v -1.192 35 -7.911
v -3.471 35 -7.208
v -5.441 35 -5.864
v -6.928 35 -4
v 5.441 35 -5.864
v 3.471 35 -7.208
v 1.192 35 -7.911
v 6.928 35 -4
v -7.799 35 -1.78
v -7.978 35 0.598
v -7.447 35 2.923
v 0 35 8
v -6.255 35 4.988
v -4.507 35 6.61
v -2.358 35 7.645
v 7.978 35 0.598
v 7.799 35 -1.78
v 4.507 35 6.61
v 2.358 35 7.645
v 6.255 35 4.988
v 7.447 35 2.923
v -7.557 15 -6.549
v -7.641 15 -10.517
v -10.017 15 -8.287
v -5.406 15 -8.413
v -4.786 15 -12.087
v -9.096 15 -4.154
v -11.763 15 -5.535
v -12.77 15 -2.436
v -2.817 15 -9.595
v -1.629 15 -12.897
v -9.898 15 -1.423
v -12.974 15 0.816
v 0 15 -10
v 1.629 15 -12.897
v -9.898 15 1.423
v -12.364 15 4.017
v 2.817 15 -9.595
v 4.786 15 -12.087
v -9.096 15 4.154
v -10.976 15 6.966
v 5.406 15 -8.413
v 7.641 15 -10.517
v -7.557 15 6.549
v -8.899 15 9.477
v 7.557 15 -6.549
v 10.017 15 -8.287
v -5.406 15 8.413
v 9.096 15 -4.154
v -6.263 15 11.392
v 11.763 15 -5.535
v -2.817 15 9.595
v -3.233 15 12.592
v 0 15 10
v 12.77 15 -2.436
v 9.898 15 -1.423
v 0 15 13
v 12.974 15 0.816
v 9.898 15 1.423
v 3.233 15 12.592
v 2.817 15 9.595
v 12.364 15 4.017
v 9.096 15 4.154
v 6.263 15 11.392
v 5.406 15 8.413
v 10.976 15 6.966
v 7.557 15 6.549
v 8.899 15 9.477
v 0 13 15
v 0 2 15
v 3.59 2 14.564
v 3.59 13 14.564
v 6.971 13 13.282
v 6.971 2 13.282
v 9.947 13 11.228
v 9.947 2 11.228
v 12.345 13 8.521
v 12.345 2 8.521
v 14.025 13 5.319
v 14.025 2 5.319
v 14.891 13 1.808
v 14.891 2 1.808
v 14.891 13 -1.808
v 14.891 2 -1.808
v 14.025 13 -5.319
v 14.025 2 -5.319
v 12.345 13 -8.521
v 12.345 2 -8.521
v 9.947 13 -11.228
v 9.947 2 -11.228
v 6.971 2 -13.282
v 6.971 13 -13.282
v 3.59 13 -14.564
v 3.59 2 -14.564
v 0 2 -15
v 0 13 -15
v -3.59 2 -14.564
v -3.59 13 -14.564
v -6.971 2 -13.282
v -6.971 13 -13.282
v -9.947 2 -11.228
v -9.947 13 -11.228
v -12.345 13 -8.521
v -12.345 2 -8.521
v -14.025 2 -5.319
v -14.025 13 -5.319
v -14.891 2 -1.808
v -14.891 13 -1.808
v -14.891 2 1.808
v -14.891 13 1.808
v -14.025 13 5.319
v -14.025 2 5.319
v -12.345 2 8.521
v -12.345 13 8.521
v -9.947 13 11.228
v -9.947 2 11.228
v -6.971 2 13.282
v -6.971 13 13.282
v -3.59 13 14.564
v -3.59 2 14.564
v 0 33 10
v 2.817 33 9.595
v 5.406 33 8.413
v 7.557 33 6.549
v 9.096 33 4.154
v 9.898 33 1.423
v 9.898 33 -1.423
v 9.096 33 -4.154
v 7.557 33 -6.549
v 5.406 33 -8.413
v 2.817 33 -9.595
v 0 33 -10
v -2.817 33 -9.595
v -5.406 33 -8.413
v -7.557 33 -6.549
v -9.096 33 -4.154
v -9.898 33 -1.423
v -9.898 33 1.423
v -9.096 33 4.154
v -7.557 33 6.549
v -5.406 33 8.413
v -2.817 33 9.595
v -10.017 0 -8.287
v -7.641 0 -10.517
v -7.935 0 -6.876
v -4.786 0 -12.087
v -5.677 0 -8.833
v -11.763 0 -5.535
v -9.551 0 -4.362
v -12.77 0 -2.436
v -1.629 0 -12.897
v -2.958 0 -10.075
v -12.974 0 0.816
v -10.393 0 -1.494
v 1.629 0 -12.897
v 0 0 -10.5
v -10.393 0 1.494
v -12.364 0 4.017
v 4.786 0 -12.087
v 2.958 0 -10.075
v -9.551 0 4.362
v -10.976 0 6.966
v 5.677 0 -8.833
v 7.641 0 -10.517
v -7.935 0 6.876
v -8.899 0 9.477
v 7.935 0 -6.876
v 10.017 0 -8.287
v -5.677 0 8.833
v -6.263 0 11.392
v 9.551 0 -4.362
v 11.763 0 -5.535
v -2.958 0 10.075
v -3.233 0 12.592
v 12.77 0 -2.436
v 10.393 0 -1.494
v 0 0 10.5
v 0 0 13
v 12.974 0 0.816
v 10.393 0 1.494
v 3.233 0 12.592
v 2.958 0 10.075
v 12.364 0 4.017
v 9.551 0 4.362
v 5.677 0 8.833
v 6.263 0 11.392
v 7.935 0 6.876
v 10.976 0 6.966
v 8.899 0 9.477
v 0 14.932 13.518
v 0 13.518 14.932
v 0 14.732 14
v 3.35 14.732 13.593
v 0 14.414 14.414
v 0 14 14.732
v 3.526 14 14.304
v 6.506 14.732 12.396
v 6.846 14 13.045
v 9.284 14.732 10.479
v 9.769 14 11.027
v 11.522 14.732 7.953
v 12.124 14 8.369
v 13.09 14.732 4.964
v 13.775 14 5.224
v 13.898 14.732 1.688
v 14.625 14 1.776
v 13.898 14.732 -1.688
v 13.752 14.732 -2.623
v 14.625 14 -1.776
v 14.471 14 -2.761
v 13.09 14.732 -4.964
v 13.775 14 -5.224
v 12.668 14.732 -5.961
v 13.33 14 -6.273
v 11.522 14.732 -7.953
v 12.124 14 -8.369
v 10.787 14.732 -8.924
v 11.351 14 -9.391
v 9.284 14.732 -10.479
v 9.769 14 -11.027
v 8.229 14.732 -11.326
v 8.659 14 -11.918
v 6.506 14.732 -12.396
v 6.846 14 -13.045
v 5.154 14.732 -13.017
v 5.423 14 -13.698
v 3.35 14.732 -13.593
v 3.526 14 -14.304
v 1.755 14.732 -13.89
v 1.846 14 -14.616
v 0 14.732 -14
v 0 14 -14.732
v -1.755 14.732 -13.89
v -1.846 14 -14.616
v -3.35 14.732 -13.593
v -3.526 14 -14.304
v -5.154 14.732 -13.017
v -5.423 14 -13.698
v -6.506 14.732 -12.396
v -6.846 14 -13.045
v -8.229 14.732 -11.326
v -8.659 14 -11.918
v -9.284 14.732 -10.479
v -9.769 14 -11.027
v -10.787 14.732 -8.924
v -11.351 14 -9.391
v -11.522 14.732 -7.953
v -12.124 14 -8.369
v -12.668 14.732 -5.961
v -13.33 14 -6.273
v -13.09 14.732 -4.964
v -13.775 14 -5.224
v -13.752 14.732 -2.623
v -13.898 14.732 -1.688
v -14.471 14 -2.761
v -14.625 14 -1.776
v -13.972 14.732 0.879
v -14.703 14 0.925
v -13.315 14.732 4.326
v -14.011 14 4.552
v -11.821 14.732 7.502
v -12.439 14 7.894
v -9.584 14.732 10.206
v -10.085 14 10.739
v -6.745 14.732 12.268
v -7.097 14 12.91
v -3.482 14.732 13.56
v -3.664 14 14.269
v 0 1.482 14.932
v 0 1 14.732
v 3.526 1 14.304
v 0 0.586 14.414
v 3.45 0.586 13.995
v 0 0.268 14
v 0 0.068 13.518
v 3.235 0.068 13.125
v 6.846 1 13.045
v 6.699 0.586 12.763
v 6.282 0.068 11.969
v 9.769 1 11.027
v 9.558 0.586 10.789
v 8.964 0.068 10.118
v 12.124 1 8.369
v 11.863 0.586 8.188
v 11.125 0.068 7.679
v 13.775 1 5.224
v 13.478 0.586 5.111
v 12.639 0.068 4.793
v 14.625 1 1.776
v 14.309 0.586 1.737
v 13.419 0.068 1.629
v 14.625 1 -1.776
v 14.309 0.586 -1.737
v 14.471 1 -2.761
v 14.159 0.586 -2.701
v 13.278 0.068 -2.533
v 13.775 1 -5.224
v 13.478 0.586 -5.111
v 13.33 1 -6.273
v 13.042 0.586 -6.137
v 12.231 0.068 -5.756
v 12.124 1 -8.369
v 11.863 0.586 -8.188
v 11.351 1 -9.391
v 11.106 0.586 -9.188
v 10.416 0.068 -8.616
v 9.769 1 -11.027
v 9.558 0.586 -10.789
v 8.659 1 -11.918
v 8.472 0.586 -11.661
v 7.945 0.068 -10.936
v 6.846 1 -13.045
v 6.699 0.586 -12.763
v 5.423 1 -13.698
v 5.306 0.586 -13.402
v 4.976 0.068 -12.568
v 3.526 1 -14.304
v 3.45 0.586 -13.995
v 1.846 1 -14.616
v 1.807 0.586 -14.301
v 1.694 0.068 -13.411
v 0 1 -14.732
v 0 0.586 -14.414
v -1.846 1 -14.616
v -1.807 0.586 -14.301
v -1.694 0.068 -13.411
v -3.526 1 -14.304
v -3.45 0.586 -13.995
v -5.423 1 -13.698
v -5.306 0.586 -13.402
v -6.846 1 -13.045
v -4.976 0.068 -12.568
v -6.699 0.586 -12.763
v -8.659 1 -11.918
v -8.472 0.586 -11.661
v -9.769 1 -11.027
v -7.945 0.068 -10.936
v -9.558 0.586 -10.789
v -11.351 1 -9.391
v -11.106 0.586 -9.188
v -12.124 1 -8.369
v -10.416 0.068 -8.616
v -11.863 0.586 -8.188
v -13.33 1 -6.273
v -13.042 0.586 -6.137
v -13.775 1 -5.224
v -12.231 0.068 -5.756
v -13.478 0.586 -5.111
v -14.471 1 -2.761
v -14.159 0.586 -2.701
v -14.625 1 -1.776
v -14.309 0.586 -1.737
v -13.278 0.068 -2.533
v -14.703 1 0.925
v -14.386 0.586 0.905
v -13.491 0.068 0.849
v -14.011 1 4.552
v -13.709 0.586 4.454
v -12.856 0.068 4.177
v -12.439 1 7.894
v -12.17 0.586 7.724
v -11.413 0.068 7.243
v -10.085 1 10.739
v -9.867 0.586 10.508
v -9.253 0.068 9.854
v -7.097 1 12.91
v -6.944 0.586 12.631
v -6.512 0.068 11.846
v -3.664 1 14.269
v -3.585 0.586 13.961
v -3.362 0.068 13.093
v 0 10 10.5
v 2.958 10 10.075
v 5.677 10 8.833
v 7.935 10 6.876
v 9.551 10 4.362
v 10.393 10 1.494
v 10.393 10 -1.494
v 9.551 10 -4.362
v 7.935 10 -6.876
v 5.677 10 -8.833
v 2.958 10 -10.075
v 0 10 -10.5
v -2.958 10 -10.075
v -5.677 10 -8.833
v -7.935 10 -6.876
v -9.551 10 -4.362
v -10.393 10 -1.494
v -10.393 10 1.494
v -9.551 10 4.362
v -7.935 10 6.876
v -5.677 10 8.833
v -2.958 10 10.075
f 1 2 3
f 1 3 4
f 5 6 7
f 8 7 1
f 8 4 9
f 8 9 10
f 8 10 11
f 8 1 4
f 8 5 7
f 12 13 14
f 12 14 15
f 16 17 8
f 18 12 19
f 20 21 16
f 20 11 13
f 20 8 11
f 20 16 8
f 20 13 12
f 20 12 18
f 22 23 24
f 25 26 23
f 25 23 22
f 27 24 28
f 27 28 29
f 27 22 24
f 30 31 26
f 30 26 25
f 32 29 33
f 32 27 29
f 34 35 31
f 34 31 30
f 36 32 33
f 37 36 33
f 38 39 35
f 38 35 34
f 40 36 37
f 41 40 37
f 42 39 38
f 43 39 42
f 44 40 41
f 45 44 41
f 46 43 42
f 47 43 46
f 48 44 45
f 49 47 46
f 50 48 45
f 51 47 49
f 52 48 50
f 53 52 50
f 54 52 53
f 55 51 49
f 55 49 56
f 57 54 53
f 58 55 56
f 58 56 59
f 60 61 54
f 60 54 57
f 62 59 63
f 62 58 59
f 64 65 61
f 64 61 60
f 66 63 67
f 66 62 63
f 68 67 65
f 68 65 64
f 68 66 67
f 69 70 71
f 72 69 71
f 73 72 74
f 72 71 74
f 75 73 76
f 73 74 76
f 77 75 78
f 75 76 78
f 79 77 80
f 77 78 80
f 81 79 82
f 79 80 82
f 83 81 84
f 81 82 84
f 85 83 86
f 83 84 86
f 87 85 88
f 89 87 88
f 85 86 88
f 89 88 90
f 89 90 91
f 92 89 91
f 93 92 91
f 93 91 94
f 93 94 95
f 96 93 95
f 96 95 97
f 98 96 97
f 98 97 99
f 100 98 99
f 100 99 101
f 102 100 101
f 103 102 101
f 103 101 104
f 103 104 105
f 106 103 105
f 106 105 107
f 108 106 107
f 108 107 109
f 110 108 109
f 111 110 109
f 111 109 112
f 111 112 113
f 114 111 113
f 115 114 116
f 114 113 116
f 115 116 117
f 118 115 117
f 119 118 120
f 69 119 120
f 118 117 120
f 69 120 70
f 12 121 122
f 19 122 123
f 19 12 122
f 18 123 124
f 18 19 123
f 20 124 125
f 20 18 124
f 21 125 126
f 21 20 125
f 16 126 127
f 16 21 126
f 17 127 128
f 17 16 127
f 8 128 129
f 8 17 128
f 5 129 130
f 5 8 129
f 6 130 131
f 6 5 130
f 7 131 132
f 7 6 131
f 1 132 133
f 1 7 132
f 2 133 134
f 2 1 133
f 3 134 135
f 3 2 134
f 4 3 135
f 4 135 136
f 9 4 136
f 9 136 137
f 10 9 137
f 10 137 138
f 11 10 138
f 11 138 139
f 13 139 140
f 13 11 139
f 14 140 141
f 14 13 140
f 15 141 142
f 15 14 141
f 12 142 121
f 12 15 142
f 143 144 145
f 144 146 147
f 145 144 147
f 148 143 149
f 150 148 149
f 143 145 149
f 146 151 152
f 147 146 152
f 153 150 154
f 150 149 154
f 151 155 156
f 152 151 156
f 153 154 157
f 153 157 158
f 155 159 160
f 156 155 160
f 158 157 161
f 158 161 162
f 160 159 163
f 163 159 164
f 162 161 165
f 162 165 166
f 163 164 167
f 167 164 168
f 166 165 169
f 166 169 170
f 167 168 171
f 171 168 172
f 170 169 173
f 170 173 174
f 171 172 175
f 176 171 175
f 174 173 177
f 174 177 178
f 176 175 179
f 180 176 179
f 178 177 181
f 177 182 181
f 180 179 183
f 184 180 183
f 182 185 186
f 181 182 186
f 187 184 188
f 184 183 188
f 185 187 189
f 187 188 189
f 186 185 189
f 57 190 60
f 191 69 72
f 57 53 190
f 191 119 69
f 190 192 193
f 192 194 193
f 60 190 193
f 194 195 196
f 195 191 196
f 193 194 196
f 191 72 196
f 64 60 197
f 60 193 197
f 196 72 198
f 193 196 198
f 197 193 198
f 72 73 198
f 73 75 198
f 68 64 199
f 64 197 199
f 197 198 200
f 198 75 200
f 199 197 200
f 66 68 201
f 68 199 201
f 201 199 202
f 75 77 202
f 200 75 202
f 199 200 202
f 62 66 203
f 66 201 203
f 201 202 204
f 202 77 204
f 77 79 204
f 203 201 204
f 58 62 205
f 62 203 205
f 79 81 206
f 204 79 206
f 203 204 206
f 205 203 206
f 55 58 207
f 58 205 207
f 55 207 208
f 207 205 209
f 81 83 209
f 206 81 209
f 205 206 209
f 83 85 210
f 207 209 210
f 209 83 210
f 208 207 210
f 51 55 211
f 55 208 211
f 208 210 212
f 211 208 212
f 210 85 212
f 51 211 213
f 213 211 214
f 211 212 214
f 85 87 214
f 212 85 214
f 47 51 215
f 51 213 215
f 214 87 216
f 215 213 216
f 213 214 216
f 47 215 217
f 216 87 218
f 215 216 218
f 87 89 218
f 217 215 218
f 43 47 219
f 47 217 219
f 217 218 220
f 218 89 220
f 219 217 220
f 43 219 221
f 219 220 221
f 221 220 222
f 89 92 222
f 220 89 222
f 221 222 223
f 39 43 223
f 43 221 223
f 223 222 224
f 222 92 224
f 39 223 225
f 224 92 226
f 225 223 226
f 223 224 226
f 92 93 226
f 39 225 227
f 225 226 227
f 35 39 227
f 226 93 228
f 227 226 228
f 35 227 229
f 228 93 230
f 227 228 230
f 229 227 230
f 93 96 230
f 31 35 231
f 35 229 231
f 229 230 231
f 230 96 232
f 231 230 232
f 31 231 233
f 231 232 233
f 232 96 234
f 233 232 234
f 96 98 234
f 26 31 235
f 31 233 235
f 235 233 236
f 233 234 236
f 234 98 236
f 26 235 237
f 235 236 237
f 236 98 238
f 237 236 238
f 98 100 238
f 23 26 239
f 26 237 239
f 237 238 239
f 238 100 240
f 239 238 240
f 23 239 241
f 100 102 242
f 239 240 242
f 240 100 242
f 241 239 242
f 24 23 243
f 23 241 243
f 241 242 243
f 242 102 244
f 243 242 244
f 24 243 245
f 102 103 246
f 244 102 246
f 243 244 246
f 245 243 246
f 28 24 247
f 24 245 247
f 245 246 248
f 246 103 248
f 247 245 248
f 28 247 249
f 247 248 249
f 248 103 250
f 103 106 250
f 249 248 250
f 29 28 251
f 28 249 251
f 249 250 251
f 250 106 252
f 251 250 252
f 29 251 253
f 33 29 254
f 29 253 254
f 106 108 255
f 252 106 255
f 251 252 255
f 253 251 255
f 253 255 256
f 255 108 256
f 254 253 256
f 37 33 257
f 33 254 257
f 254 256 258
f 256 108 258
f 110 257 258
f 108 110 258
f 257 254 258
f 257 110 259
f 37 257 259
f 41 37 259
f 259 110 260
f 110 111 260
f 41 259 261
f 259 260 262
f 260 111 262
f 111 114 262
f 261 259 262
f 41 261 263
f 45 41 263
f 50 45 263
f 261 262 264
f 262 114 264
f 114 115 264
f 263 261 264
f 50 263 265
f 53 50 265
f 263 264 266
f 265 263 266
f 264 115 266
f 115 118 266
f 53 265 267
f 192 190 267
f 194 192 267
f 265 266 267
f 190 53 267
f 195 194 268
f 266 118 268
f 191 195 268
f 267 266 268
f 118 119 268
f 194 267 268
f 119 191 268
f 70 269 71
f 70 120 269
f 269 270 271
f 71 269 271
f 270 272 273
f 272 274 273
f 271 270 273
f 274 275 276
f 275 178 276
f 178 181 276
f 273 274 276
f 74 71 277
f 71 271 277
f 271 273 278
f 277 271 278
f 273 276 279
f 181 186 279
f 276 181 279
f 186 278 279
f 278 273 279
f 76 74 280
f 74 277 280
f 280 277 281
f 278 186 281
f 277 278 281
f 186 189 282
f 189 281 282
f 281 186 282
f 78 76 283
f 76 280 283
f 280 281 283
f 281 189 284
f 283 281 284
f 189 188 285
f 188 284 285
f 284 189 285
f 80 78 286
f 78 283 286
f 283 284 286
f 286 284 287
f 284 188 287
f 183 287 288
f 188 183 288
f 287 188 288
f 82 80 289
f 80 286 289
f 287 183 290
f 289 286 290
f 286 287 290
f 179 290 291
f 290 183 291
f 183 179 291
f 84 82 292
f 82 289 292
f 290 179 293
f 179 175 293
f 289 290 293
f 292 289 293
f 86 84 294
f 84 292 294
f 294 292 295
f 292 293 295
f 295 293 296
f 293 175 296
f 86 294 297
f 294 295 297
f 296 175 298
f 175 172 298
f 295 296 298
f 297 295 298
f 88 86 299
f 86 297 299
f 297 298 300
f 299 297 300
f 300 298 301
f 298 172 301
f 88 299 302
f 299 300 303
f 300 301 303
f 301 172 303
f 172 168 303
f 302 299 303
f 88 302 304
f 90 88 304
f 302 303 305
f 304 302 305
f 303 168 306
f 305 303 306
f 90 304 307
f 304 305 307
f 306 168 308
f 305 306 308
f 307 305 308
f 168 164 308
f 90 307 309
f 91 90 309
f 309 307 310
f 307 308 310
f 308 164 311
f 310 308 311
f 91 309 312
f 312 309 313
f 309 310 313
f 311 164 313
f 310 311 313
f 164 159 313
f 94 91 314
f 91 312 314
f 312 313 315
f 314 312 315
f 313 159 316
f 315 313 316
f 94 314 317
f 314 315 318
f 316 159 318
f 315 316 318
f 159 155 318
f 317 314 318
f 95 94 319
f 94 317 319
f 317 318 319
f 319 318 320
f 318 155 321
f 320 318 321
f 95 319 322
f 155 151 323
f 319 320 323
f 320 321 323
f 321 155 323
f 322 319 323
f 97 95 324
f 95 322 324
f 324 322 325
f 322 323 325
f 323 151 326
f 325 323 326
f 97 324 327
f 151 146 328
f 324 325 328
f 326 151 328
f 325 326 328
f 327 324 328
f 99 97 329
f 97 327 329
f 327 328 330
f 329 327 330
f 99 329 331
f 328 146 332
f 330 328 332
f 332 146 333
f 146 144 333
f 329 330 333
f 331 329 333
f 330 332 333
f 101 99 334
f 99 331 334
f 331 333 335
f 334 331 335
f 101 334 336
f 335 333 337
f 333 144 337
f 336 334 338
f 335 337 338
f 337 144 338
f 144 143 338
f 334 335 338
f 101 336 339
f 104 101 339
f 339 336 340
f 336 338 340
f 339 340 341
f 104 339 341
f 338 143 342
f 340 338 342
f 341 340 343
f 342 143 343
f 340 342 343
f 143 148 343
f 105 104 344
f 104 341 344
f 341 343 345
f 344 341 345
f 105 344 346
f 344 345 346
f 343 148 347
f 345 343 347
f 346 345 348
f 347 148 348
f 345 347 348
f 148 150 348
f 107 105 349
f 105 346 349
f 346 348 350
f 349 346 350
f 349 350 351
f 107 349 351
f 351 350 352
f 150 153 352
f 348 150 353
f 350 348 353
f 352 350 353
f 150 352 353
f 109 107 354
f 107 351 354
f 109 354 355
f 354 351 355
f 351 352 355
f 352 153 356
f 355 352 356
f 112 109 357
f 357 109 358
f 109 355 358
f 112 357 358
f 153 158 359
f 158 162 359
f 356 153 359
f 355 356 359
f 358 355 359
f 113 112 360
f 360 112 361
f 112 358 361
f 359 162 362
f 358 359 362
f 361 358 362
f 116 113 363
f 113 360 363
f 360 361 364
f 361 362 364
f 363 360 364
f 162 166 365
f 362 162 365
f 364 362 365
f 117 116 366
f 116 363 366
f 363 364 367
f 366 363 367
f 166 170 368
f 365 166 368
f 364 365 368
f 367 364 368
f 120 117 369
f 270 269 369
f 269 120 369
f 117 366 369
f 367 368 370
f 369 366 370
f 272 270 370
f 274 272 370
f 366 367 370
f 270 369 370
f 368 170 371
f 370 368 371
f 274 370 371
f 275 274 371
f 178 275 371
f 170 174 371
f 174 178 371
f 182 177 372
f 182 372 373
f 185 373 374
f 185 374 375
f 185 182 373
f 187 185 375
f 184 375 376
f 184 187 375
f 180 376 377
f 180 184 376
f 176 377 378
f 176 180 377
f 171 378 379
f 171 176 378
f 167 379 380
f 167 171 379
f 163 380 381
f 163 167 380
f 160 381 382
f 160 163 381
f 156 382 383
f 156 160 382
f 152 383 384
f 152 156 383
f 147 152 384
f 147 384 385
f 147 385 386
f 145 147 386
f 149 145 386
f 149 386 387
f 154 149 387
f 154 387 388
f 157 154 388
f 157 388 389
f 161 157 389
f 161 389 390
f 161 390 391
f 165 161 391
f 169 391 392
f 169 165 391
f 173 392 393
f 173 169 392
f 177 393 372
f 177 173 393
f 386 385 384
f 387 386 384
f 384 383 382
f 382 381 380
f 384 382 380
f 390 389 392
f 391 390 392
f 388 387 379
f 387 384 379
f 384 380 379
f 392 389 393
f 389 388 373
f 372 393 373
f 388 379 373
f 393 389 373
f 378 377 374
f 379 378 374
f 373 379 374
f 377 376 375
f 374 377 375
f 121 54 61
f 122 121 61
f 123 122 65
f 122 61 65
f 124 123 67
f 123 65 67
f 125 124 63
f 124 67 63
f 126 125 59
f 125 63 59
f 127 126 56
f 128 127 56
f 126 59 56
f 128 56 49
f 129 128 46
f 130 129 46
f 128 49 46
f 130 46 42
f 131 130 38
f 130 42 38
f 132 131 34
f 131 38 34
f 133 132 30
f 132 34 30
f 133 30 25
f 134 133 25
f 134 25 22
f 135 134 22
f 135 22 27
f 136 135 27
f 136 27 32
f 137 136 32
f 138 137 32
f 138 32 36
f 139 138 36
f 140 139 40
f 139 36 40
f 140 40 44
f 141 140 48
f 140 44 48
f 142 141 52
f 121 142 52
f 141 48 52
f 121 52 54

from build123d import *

# Parameters (mm, degrees)
SKETCH1_R           = 15
SKETCH1_R_2         = 10.5
BOSS_EXTRUDE1_DEPTH = 10
SKETCH2_R           = 15
BOSS_EXTRUDE2_DEPTH = 5
SKETCH3_R           = 10
BOSS_EXTRUDE3_DEPTH = 20
CHAMFER2_SIZE       = 2
FILLET1_R           = 2


with BuildPart() as part:
    # Sketch1 → Boss-Extrude1 (new body)
    with BuildSketch(Plane(origin=(0, 0, 0), x_dir=(1, 0, 0), z_dir=(0, 1, 0))):
        with Locations(Location((0, 0, 0), (0, 0, 270))):
            Circle(SKETCH1_R)
        with Locations(Location((0, 0, 0), (0, 0, 270))):
            Circle(SKETCH1_R_2, mode=Mode.SUBTRACT)
    extrude(amount=BOSS_EXTRUDE1_DEPTH)

    # Sketch2 → Boss-Extrude2 (add)
    with BuildSketch(Plane(origin=(0, 10, 0), x_dir=(1, 0, 0), z_dir=(0, 1, 0))):
        with Locations(Location((0, 0, 0), (0, 0, 270))):
            Circle(SKETCH2_R)
    extrude(amount=BOSS_EXTRUDE2_DEPTH)

    # Sketch3 → Boss-Extrude3 (add)
    with BuildSketch(Plane(origin=(0, 15, 0), x_dir=(1, 0, 0), z_dir=(0, 1, 0))):
        with Locations(Location((0, 0, 0), (0, 0, 270))):
            Circle(SKETCH3_R)
    extrude(amount=BOSS_EXTRUDE3_DEPTH)

    # Chamfer2
    chamfer2_edges = [part.edges().sort_by_distance(p)[0] for p in [
        (0, 35, -10),
    ]]
    chamfer(chamfer2_edges, length=CHAMFER2_SIZE)

    # Fillet1
    fillet1_edges = [part.edges().sort_by_distance(p)[0] for p in [
        (0, 0, -15),
        (0, 15, -15),
    ]]
    fillet(fillet1_edges, radius=FILLET1_R)


solid = part.part
